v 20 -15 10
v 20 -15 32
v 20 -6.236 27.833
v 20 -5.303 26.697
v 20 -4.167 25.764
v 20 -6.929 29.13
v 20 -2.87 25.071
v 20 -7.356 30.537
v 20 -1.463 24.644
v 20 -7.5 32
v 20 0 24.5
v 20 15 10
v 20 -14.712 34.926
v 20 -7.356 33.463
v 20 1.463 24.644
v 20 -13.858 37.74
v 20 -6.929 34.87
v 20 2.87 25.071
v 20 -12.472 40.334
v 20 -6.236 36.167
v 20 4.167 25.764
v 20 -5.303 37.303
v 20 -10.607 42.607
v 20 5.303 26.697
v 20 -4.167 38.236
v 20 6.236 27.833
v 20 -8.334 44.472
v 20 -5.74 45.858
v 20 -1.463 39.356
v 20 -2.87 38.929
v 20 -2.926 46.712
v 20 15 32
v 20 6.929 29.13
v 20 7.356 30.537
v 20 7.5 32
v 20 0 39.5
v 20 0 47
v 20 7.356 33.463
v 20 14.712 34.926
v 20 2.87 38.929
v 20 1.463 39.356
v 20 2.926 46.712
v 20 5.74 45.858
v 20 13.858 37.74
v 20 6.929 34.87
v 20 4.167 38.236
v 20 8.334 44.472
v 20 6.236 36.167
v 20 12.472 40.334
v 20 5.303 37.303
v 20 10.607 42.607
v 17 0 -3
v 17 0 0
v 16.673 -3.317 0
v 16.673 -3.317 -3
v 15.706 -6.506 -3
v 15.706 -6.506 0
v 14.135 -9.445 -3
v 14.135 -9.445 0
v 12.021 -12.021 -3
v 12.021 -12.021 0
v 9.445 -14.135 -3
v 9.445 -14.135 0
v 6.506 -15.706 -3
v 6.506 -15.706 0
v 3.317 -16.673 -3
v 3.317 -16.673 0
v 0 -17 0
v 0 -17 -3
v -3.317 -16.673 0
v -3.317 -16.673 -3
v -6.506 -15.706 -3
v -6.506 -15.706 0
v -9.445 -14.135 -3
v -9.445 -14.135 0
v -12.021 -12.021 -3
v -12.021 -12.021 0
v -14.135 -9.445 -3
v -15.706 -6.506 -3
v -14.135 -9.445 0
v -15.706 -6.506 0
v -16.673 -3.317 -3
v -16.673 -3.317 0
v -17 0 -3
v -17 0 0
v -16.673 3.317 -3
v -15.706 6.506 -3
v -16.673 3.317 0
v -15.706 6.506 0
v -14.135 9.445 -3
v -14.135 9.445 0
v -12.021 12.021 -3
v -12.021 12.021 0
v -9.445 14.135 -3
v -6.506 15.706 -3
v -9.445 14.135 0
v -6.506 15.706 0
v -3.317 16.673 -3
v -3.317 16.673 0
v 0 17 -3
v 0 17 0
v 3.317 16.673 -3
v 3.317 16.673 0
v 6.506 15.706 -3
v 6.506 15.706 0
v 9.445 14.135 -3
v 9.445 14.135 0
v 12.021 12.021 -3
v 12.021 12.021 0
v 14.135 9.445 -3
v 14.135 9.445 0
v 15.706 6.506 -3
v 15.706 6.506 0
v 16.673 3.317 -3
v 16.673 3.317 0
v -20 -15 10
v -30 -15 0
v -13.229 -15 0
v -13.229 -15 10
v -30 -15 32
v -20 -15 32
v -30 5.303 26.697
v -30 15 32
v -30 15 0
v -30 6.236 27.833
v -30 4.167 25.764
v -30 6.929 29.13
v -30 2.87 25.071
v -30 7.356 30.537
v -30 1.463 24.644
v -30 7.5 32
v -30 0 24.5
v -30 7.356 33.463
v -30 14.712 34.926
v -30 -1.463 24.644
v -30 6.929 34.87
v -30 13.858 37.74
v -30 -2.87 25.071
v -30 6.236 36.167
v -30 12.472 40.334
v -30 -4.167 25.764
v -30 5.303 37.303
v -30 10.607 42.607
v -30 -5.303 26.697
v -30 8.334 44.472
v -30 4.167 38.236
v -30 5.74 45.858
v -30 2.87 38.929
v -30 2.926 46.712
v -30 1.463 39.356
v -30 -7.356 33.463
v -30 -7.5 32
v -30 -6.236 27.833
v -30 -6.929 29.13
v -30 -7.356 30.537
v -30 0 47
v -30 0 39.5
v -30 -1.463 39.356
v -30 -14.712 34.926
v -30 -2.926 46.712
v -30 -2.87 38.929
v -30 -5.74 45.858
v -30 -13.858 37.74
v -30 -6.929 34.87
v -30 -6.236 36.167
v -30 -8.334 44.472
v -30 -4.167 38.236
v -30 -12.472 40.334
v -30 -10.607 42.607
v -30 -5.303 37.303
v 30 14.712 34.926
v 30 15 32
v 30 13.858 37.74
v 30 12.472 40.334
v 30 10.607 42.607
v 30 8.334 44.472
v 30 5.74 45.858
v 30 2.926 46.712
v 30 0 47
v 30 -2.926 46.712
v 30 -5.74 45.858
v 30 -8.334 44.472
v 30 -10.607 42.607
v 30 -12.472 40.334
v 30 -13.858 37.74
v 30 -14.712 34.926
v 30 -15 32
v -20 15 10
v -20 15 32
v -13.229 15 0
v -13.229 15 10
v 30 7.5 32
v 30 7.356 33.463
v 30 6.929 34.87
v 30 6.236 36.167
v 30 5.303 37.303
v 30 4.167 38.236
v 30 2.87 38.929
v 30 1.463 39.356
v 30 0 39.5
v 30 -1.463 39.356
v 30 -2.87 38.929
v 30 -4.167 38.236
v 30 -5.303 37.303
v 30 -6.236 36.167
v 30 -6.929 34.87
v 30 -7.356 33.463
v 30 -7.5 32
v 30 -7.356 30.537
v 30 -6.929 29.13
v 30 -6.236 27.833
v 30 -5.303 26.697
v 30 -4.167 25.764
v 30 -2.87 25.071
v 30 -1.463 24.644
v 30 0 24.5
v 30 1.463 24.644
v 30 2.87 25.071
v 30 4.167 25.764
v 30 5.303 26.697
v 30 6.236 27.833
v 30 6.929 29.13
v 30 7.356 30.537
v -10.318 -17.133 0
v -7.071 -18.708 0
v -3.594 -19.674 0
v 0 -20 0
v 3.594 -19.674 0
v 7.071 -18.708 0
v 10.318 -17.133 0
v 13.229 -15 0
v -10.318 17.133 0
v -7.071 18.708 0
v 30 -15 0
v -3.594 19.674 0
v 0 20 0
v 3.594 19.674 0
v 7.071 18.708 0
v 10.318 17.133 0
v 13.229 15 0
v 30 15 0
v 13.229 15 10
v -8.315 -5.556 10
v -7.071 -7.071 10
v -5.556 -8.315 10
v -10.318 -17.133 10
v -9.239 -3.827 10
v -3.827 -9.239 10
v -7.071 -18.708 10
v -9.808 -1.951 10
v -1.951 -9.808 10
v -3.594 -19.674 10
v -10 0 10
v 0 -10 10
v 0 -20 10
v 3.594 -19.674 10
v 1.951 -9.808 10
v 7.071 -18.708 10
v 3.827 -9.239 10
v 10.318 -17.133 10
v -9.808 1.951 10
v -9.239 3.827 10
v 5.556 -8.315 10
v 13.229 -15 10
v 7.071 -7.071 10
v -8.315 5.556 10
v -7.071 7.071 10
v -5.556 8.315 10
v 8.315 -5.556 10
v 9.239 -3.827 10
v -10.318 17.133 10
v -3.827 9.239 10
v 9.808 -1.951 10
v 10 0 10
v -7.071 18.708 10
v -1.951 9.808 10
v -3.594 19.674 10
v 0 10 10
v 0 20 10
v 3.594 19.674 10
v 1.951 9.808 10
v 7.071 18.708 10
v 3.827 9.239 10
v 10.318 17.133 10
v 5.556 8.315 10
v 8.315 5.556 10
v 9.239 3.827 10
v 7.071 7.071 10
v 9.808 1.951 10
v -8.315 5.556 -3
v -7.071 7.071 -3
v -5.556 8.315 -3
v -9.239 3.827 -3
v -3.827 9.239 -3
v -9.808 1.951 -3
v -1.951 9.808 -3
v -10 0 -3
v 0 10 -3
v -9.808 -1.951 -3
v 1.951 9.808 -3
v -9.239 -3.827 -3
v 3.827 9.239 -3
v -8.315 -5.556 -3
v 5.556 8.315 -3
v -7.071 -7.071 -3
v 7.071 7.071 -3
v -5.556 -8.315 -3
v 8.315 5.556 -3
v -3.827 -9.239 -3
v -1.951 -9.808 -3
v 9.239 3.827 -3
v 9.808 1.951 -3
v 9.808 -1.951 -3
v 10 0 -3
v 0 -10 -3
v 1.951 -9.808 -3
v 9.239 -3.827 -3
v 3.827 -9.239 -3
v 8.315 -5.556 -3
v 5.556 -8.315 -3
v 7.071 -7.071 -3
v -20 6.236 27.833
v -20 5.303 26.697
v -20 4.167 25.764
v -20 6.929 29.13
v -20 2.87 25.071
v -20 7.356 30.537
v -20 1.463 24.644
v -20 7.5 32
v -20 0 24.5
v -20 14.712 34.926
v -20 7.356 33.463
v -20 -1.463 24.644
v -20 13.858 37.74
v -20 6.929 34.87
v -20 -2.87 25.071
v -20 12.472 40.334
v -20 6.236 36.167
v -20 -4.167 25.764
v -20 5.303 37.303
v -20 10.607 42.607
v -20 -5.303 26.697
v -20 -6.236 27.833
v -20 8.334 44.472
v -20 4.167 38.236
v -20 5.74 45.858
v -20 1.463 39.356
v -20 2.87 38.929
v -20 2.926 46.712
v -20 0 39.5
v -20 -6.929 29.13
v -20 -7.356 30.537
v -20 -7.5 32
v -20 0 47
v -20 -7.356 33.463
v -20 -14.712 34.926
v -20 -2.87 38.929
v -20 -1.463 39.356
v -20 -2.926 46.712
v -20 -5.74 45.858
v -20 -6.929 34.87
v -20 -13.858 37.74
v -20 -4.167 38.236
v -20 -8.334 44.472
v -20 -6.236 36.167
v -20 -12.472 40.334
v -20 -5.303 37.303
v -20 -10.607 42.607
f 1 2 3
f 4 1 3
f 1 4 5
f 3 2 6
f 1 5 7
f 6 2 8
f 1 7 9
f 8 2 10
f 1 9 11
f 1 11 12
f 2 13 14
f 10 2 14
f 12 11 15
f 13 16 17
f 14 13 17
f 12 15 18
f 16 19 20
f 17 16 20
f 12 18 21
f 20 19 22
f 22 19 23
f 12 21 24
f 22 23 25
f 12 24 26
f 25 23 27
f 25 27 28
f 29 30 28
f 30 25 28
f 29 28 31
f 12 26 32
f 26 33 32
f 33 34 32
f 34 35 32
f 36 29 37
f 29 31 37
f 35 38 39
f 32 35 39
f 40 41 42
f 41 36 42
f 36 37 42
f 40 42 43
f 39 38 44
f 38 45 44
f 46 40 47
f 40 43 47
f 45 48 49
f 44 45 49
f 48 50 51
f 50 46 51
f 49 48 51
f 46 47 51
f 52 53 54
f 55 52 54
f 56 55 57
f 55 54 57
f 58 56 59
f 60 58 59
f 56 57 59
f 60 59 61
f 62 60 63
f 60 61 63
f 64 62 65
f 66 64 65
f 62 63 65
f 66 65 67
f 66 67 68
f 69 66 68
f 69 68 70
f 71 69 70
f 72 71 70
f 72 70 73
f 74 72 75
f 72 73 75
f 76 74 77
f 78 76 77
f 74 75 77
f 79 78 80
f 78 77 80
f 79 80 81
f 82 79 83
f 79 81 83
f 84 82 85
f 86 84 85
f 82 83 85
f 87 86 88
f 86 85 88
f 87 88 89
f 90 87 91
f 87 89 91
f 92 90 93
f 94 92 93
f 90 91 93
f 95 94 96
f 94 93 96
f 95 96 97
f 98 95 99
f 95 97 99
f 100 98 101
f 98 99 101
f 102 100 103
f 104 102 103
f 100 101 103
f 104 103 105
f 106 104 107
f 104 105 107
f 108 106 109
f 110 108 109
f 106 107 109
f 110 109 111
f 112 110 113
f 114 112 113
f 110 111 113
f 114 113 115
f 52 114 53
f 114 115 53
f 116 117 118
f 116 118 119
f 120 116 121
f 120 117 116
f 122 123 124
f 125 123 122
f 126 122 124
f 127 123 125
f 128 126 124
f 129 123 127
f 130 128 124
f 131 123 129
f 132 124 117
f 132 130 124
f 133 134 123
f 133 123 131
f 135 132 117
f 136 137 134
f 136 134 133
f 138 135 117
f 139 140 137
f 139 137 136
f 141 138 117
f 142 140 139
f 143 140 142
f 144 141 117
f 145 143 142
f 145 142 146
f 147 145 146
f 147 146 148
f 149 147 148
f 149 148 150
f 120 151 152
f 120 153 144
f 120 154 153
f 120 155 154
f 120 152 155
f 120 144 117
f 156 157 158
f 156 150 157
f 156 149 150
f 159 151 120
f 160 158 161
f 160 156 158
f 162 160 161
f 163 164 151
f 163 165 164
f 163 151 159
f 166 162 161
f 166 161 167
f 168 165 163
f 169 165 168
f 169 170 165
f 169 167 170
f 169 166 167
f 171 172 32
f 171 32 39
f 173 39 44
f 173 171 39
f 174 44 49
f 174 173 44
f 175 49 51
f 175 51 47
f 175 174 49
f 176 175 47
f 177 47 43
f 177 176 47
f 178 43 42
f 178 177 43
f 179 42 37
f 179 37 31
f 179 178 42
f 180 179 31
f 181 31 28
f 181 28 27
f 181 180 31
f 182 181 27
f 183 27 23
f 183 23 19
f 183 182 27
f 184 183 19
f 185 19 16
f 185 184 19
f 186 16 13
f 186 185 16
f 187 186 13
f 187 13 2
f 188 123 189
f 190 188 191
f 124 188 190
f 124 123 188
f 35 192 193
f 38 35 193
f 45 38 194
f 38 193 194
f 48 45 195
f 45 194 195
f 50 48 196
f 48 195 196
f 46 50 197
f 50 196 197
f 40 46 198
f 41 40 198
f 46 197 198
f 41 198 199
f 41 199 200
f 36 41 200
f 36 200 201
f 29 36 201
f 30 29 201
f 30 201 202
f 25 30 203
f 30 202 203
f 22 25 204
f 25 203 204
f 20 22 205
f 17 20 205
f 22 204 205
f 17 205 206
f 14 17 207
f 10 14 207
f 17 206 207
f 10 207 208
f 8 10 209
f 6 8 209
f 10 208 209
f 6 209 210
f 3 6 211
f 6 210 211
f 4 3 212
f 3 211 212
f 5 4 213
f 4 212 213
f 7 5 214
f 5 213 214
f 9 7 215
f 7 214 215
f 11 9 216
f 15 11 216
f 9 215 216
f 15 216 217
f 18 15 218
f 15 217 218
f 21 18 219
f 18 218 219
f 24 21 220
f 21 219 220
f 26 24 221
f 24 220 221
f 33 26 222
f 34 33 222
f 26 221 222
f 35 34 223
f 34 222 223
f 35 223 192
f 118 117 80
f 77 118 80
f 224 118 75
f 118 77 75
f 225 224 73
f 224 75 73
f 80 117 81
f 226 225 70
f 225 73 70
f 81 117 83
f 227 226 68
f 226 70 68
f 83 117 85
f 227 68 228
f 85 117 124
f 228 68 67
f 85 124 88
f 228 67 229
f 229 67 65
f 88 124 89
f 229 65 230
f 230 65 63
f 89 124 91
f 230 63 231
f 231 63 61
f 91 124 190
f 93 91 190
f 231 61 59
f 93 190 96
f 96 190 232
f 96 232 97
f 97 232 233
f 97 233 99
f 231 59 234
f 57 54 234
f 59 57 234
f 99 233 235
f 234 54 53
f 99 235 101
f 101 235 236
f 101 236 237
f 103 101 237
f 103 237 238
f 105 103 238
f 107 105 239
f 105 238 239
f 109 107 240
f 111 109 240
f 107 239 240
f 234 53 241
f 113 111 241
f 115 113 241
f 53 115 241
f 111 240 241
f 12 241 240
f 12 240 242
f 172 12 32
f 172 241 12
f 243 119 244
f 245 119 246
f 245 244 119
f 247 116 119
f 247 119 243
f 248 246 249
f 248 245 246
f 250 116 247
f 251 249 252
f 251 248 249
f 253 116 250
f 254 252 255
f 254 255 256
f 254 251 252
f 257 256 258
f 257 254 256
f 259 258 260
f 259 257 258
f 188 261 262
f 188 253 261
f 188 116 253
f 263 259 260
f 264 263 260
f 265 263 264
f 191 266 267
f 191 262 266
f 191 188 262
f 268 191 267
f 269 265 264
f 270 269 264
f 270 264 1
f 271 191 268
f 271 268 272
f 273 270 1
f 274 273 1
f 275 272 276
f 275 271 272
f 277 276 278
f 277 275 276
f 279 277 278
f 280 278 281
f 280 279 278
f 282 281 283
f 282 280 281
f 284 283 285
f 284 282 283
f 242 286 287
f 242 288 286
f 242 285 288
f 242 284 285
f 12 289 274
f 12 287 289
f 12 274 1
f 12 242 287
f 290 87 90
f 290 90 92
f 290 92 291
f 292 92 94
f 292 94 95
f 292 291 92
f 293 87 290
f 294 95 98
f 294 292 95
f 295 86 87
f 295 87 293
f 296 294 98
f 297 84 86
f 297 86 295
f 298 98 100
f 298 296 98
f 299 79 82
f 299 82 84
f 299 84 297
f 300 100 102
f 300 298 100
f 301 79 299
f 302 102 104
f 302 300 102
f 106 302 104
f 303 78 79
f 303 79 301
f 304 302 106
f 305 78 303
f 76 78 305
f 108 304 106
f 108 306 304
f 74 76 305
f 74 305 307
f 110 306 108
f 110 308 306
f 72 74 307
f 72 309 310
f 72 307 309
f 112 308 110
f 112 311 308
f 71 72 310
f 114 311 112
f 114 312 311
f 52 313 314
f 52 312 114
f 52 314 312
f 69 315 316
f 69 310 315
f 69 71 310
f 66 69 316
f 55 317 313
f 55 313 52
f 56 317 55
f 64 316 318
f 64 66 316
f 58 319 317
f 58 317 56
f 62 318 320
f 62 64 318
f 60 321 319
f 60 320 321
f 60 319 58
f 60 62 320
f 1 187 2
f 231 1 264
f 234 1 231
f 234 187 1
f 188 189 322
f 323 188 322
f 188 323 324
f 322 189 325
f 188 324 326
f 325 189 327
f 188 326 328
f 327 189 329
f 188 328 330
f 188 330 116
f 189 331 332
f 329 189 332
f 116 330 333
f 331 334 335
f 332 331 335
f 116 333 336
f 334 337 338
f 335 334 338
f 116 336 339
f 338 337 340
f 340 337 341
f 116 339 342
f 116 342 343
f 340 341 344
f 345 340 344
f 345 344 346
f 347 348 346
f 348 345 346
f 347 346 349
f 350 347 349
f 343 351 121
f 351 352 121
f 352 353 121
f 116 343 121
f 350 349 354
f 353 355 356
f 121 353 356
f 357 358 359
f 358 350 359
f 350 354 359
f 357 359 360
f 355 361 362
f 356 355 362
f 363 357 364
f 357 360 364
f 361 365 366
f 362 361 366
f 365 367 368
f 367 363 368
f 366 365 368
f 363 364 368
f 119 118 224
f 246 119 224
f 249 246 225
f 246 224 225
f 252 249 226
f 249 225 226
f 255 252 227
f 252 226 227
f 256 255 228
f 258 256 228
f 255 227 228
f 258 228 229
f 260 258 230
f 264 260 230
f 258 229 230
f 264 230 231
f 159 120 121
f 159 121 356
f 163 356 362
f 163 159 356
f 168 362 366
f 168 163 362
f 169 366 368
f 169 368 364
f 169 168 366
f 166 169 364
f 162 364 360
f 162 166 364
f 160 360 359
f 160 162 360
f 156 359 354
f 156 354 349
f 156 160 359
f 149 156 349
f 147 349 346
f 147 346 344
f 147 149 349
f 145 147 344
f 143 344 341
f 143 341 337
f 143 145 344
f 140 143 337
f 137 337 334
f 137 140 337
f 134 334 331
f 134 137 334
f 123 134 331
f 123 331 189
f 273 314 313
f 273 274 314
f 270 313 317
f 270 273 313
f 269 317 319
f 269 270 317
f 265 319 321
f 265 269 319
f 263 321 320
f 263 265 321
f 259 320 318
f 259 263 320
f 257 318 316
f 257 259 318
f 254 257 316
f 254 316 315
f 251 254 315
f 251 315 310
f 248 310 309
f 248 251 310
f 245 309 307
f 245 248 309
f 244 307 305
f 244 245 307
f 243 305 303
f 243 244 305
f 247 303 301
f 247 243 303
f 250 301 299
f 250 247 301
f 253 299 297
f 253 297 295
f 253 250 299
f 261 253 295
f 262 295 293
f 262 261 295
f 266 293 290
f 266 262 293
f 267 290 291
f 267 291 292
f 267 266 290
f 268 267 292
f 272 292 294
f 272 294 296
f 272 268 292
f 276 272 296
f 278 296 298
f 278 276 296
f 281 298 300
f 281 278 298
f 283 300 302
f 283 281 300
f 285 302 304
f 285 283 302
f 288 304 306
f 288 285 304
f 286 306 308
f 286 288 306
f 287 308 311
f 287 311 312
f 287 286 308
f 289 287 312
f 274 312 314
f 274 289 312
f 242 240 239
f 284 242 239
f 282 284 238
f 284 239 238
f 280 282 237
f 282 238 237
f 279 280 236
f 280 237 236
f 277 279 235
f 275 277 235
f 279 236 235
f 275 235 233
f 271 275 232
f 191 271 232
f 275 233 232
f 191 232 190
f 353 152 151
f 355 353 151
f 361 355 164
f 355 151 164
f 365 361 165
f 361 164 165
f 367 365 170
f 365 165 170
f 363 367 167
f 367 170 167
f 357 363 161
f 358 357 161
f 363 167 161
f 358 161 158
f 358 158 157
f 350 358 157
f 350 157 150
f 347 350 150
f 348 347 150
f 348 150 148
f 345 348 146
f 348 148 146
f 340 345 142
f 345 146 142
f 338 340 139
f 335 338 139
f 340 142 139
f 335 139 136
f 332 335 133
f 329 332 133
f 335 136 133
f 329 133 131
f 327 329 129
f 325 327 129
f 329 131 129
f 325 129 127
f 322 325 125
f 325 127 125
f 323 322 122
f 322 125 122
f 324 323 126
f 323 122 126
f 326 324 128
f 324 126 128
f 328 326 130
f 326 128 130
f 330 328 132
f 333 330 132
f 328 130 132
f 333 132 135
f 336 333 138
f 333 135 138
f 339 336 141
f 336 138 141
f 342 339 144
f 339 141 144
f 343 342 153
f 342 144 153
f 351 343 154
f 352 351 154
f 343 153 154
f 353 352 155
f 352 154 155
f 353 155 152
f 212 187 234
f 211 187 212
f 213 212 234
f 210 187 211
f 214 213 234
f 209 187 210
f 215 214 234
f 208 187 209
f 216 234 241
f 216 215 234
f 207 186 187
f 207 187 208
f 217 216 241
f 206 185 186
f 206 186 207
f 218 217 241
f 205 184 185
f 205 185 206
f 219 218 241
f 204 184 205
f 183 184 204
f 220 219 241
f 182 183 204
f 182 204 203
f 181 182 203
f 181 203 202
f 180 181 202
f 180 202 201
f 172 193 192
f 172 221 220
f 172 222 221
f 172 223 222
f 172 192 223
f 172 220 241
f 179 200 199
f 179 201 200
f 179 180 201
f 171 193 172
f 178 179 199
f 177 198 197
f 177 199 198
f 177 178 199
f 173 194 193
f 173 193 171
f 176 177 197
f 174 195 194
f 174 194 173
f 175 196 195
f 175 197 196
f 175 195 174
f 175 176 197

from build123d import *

# Parameters (mm, degrees)
F0_R     = 10
F1_DEPTH = 10
F2_R     = 17
F2_R_2   = 10
F3_DEPTH = 3
F4_R     = 7.5
F5_DEPTH = 10
F6_R     = 7.5
F7_DEPTH = 10


with BuildPart() as f1:
    # F0 (on Top) → F1 (new body)
    with BuildSketch(Plane.XY):
        with BuildLine():
            ThreePointArc((-13.2287565553, -15), (-20, 0), (-13.2287565553, 15))
            Line((-13.2287565553, 15), (-30, 15))
            Line((-30, 15), (-30, -15))
            Line((-30, -15), (-13.2287565553, -15))
        make_face()
        with BuildLine():
            Line((-13.2287565553, 15), (13.2287565553, 15))
            ThreePointArc((13.2287565553, 15), (0, 20), (-13.2287565553, 15))
        make_face()
        with BuildLine():
            ThreePointArc((20, 0), (18.2287565553, 8.2287565553), (13.2287565553, 15))
            Line((13.2287565553, 15), (-13.2287565553, 15))
            ThreePointArc((-13.2287565553, 15), (-20, 0), (-13.2287565553, -15))
            Line((-13.2287565553, -15), (13.2287565553, -15))
            ThreePointArc((13.2287565553, -15), (18.2287565553, -8.2287565553), (20, 0))
        make_face()
        Circle(F0_R, mode=Mode.SUBTRACT)
        with BuildLine():
            Line((30, -15), (30, 15))
            Line((30, 15), (13.2287565553, 15))
            ThreePointArc((13.2287565553, 15), (18.2287565553, 8.2287565553), (20, 0))
            ThreePointArc((20, 0), (18.2287565553, -8.2287565553), (13.2287565553, -15))
            Line((13.2287565553, -15), (30, -15))
        make_face()
        with BuildLine():
            ThreePointArc((-13.2287565553, -15), (0, -20), (13.2287565553, -15))
            Line((13.2287565553, -15), (-13.2287565553, -15))
        make_face()
    extrude(amount=F1_DEPTH)

    # F2 (on face) → F3 (join)
    with BuildSketch(Plane(origin=(0, 0, 0), x_dir=(1, 0, 0), z_dir=(0, 0, -1))):
        Circle(F2_R)
        Circle(F2_R_2, mode=Mode.SUBTRACT)
    extrude(amount=F3_DEPTH)

    # F4 (on face) → F5 (join)
    with BuildSketch(Plane.YZ.offset(30)):
        with BuildLine():
            Line((-15, 32), (-15, 10))
            Line((-15, 10), (15, 10))
            Line((15, 10), (15, 32))
            ThreePointArc((15, 32), (0, 47), (-15, 32))
        make_face()
        with Locations((0, 32)):
            Circle(F4_R, mode=Mode.SUBTRACT)
    extrude(amount=-F5_DEPTH)

    # F6 (on face) → F7 (join)
    with BuildSketch(Plane(origin=(-30, 0, 0), x_dir=(0, -1, 0), z_dir=(-1, 0, 0))):
        with BuildLine():
            Line((-15, 10), (15, 10))
            Line((15, 10), (15, 32))
            ThreePointArc((15, 32), (0, 47), (-15, 32))
            Line((-15, 32), (-15, 10))
        make_face()
        with Locations((0, 32)):
            Circle(F6_R, mode=Mode.SUBTRACT)
    extrude(amount=-F7_DEPTH)


solid = f1.part
